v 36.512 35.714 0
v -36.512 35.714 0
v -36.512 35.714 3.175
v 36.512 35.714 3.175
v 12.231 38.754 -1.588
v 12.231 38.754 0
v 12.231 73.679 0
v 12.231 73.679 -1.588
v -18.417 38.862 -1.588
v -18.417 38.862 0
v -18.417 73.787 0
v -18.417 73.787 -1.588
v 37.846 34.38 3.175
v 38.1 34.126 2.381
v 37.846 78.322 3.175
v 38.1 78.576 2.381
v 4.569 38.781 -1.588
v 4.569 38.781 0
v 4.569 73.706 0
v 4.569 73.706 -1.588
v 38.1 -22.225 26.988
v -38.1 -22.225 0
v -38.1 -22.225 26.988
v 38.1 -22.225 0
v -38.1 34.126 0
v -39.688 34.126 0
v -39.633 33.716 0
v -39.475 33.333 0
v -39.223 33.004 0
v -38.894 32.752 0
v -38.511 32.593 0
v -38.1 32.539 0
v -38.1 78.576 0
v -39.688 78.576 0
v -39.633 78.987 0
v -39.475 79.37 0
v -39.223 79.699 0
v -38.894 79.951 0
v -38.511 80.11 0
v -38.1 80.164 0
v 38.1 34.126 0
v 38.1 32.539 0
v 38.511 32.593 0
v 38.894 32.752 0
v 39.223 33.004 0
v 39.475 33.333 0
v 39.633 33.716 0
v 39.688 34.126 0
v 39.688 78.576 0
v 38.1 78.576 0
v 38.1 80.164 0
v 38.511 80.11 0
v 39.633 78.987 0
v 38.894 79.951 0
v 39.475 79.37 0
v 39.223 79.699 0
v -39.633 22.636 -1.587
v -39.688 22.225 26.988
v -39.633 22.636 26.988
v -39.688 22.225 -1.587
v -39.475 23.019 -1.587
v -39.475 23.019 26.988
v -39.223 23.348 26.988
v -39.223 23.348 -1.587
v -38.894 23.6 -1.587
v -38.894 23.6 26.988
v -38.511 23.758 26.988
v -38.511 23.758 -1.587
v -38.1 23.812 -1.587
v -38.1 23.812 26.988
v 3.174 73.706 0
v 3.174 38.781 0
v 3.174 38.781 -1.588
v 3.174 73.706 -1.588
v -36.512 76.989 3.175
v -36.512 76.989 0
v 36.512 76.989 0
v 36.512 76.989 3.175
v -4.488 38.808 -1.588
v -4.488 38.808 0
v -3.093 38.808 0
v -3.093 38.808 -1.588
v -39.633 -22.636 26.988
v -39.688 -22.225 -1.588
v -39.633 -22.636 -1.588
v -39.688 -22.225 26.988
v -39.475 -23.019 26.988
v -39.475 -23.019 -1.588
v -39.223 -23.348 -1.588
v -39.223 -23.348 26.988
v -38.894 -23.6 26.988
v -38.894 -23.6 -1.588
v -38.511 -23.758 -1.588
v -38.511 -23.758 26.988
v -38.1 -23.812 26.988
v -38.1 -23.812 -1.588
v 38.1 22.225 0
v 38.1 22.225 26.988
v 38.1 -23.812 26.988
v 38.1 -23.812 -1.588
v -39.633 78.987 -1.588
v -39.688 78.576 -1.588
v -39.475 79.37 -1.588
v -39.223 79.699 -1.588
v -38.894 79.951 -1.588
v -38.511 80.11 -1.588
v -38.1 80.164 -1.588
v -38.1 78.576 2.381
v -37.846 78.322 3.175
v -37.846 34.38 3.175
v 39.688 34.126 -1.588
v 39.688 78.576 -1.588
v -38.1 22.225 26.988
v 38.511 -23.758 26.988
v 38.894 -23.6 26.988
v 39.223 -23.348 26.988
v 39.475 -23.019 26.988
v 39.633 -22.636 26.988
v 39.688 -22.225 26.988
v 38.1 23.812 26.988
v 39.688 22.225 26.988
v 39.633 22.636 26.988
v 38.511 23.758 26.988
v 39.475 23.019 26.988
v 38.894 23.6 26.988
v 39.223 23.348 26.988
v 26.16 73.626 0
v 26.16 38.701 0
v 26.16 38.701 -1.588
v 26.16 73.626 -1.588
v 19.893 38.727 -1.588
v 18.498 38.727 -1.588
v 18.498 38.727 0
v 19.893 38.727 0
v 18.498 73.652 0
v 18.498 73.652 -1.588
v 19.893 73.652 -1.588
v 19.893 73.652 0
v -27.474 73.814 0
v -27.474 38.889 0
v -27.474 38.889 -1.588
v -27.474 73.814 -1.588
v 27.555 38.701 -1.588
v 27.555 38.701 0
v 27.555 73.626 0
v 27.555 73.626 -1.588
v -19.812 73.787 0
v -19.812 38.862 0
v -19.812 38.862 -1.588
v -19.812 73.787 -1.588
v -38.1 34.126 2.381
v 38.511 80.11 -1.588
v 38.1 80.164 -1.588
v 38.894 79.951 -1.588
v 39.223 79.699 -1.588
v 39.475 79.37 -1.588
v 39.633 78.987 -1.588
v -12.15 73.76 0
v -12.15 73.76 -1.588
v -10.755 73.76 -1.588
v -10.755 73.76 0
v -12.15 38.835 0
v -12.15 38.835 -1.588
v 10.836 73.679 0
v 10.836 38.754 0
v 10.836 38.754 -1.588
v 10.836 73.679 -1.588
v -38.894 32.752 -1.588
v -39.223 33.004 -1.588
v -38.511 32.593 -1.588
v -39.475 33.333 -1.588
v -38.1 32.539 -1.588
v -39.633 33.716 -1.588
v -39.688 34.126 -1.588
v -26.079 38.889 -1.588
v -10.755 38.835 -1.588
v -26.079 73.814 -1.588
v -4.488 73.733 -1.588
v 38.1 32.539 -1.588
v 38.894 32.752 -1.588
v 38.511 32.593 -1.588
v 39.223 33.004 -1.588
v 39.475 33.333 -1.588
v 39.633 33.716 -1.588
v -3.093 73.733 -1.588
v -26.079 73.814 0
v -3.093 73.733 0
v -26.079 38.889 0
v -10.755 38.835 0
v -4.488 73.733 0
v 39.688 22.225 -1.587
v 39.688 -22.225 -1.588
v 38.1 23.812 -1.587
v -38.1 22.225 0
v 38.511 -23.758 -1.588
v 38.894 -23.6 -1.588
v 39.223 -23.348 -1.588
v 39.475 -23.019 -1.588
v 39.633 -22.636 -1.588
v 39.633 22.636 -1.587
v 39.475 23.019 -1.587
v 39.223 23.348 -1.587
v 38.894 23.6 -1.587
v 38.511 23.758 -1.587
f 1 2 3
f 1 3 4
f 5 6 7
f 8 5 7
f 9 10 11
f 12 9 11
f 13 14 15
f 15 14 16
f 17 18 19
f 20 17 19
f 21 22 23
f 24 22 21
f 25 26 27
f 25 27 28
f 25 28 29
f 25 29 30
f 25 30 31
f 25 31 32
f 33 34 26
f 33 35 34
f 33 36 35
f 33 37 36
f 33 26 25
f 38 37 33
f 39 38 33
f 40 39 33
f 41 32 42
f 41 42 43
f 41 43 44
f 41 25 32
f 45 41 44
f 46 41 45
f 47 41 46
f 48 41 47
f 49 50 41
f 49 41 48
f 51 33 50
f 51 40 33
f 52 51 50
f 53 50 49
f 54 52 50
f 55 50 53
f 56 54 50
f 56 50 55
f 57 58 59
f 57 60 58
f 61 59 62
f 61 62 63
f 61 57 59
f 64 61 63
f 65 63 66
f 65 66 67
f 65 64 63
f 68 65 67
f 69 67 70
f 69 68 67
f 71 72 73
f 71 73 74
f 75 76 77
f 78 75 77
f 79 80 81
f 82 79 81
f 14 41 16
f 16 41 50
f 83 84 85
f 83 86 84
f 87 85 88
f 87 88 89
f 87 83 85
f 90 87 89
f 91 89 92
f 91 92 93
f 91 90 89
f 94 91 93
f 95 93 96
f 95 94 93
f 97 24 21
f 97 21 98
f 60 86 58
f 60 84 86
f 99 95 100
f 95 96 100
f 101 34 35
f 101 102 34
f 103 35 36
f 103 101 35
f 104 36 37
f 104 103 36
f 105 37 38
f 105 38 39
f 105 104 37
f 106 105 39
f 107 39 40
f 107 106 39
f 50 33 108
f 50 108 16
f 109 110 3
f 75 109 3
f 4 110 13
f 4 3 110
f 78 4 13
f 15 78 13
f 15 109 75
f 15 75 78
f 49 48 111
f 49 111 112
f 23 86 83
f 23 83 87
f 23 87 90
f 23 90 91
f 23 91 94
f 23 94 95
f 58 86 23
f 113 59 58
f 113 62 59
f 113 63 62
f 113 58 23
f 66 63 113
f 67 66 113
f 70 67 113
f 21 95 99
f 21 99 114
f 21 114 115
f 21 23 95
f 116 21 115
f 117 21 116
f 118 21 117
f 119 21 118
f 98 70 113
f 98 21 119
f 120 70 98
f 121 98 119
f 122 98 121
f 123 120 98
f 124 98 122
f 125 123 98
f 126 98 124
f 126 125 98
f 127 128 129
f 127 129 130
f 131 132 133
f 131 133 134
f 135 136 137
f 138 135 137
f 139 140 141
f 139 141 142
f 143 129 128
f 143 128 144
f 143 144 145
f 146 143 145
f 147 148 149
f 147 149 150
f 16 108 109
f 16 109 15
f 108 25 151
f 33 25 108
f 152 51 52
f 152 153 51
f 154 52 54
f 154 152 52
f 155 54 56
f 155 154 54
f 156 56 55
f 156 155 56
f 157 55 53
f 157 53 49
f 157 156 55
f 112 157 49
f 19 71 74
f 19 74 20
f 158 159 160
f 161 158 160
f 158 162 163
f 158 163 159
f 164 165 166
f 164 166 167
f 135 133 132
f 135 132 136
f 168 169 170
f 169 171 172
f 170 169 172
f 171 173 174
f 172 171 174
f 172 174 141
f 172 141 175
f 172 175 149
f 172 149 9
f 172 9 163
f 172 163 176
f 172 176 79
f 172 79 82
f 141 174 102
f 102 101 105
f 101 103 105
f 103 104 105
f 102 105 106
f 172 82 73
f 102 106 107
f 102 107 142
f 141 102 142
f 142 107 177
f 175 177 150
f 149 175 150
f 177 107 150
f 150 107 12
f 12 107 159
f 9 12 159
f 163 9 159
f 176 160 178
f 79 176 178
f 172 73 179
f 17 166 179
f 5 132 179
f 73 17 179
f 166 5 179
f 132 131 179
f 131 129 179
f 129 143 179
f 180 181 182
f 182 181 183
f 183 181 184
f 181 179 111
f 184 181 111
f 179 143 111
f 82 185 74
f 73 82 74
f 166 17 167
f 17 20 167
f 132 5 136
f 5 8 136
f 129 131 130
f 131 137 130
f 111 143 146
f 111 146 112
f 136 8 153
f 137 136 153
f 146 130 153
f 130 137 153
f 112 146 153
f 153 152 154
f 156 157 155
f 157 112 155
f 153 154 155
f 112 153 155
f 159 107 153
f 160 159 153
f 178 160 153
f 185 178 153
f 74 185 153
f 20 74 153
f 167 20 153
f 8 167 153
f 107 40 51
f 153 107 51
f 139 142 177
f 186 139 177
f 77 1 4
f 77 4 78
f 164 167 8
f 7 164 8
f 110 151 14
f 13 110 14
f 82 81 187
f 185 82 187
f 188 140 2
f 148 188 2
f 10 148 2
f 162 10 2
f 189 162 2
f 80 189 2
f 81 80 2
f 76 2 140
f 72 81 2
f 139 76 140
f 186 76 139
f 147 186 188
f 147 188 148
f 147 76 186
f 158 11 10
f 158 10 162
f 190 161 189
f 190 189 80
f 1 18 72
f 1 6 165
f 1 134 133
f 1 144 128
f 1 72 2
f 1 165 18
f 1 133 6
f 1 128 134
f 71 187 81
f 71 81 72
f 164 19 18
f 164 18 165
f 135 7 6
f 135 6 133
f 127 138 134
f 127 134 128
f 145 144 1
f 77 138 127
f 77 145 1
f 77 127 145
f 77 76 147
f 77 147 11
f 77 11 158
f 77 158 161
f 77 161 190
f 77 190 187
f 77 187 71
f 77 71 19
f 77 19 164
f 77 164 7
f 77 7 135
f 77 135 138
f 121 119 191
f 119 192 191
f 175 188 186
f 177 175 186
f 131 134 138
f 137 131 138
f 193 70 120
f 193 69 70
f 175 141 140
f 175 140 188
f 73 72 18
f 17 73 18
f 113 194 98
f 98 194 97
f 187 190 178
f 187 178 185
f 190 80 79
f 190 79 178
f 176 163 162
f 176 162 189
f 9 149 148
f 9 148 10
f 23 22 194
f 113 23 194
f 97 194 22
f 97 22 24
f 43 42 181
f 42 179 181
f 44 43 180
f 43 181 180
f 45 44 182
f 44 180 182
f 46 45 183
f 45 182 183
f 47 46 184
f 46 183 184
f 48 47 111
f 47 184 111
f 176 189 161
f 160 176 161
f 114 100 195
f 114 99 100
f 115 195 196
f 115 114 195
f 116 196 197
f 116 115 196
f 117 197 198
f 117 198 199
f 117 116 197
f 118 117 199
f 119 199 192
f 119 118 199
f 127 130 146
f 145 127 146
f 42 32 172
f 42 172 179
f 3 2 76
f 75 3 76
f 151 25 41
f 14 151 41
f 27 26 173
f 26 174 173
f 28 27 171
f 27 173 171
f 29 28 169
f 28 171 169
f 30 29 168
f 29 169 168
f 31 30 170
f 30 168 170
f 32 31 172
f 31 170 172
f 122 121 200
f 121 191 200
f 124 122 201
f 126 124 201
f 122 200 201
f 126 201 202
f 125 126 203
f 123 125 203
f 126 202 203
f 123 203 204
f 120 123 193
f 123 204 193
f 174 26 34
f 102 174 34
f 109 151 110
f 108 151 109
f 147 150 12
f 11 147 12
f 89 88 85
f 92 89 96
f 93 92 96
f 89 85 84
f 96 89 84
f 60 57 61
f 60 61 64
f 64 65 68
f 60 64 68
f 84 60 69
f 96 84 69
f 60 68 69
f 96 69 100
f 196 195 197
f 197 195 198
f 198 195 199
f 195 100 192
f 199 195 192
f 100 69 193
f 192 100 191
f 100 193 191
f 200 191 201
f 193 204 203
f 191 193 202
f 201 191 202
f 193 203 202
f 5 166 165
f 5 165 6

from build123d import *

# Parameters (mm, degrees)
F0_W     = 79.375
F0_H     = 47.625
F0_W_2   = 76.2
F0_H_2   = 44.45
F1_DEPTH = 1.5875
F0_W_3   = 73.025
F0_H_3   = 41.275
F2_DEPTH = 26.9875
F3_DEPTH = 3.175
F4_R     = 1.5875
F4_2_R   = 1.5875
F5_SIZE2 = 0.79375
F5_SIZE  = 0.254
F6_W     = 1.3951079971
F6_H     = 34.925
F7_DEPTH = 1.5875


with BuildPart() as f1:
    # F0 (on Top) → F1 (new body)
    with BuildSketch(Plane.XY):
        Rectangle(F0_W, F0_H)
        Rectangle(F0_W_2, F0_H_2, mode=Mode.SUBTRACT)
        Rectangle(F0_W_2, F0_H_2)
    extrude(amount=-F1_DEPTH)

    # F0 (on Top) → F2 (join)
    with BuildSketch(Plane.XY):
        Rectangle(F0_W, F0_H)
        Rectangle(F0_W_2, F0_H_2, mode=Mode.SUBTRACT)
    extrude(amount=F2_DEPTH)

    # F4#2
    f4_2_edges = [f1.edges().sort_by_distance(p)[0] for p in [
        (39.6875, 23.8125, 12.7),
        (-39.6875, 23.8125, 12.7),
        (39.6875, -23.8125, 12.7),
        (-39.6875, -23.8125, 12.7),
    ]]
    fillet(f4_2_edges, radius=F4_2_R)


with BuildPart() as f1b:
    # F0 (on Top) → F1, piece 2 (new body)
    with BuildSketch(Plane.XY):
        with Locations((0, 56.3514009118)):
            Rectangle(F0_W, F0_H)
        with Locations((0, 56.3514009118)):
            Rectangle(F0_W_2, F0_H_2, mode=Mode.SUBTRACT)
        with Locations((0, 56.3514009118)):
            Rectangle(F0_W_2, F0_H_2)
        with Locations((0, 56.3514009118)):
            Rectangle(F0_W_3, F0_H_3, mode=Mode.SUBTRACT)
        with Locations((0, 56.3514009118)):
            Rectangle(F0_W_3, F0_H_3)
    extrude(amount=-F1_DEPTH)

    # F0 (on Top) → F3 (join)
    with BuildSketch(Plane.XY):
        with Locations((0, 56.3514009118)):
            Rectangle(F0_W_2, F0_H_2)
        with Locations((0, 56.3514009118)):
            Rectangle(F0_W_3, F0_H_3, mode=Mode.SUBTRACT)
    extrude(amount=F3_DEPTH)

    # F4
    f4_edges = [f1b.edges().sort_by_distance(p)[0] for p in [
        (-39.6875, 80.163901, -0.79375),
        (-39.6875, 32.538901, -0.79375),
        (39.6875, 80.163901, -0.79375),
        (39.6875, 32.538901, -0.79375),
    ]]
    fillet(f4_edges, radius=F4_R)

    # F5
    f5_edges = [f1b.edges().sort_by_distance(p)[0] for p in [
        (0, 78.576401, 3.175),
        (38.1, 56.351401, 3.175),
        (0, 34.126401, 3.175),
        (-38.1, 56.351401, 3.175),
    ]]
    f5_side = f1b.faces().sort_by_distance((0, 77.694231, 3.175))[0]
    chamfer(f5_edges, length=F5_SIZE, length2=F5_SIZE2, reference=f5_side)

    # F6 (on Top) → F7 (cut, through all)
    with BuildSketch(Plane.XY):
        with Locations((-26.7763854936, 56.3514009118)):
            Rectangle(F6_W, F6_H)
        with Locations((-19.1144460015, 56.3245)):
            Rectangle(F6_W, F6_H)
        with Locations((-11.4525065094, 56.2975990882)):
            Rectangle(F6_W, F6_H)
        with Locations((-3.7905670173, 56.2706981764)):
            Rectangle(F6_W, F6_H)
        with Locations((3.8713724749, 56.2437972646)):
            Rectangle(F6_W, F6_H)
        with Locations((11.533311967, 56.2168963528)):
            Rectangle(F6_W, F6_H)
        with Locations((19.1952514591, 56.189995441)):
            Rectangle(F6_W, F6_H)
        with Locations((26.8571909512, 56.1630945292)):
            Rectangle(F6_W, F6_H)
    extrude(amount=-F7_DEPTH, mode=Mode.SUBTRACT)


solid = Compound([f1.part, f1b.part])
